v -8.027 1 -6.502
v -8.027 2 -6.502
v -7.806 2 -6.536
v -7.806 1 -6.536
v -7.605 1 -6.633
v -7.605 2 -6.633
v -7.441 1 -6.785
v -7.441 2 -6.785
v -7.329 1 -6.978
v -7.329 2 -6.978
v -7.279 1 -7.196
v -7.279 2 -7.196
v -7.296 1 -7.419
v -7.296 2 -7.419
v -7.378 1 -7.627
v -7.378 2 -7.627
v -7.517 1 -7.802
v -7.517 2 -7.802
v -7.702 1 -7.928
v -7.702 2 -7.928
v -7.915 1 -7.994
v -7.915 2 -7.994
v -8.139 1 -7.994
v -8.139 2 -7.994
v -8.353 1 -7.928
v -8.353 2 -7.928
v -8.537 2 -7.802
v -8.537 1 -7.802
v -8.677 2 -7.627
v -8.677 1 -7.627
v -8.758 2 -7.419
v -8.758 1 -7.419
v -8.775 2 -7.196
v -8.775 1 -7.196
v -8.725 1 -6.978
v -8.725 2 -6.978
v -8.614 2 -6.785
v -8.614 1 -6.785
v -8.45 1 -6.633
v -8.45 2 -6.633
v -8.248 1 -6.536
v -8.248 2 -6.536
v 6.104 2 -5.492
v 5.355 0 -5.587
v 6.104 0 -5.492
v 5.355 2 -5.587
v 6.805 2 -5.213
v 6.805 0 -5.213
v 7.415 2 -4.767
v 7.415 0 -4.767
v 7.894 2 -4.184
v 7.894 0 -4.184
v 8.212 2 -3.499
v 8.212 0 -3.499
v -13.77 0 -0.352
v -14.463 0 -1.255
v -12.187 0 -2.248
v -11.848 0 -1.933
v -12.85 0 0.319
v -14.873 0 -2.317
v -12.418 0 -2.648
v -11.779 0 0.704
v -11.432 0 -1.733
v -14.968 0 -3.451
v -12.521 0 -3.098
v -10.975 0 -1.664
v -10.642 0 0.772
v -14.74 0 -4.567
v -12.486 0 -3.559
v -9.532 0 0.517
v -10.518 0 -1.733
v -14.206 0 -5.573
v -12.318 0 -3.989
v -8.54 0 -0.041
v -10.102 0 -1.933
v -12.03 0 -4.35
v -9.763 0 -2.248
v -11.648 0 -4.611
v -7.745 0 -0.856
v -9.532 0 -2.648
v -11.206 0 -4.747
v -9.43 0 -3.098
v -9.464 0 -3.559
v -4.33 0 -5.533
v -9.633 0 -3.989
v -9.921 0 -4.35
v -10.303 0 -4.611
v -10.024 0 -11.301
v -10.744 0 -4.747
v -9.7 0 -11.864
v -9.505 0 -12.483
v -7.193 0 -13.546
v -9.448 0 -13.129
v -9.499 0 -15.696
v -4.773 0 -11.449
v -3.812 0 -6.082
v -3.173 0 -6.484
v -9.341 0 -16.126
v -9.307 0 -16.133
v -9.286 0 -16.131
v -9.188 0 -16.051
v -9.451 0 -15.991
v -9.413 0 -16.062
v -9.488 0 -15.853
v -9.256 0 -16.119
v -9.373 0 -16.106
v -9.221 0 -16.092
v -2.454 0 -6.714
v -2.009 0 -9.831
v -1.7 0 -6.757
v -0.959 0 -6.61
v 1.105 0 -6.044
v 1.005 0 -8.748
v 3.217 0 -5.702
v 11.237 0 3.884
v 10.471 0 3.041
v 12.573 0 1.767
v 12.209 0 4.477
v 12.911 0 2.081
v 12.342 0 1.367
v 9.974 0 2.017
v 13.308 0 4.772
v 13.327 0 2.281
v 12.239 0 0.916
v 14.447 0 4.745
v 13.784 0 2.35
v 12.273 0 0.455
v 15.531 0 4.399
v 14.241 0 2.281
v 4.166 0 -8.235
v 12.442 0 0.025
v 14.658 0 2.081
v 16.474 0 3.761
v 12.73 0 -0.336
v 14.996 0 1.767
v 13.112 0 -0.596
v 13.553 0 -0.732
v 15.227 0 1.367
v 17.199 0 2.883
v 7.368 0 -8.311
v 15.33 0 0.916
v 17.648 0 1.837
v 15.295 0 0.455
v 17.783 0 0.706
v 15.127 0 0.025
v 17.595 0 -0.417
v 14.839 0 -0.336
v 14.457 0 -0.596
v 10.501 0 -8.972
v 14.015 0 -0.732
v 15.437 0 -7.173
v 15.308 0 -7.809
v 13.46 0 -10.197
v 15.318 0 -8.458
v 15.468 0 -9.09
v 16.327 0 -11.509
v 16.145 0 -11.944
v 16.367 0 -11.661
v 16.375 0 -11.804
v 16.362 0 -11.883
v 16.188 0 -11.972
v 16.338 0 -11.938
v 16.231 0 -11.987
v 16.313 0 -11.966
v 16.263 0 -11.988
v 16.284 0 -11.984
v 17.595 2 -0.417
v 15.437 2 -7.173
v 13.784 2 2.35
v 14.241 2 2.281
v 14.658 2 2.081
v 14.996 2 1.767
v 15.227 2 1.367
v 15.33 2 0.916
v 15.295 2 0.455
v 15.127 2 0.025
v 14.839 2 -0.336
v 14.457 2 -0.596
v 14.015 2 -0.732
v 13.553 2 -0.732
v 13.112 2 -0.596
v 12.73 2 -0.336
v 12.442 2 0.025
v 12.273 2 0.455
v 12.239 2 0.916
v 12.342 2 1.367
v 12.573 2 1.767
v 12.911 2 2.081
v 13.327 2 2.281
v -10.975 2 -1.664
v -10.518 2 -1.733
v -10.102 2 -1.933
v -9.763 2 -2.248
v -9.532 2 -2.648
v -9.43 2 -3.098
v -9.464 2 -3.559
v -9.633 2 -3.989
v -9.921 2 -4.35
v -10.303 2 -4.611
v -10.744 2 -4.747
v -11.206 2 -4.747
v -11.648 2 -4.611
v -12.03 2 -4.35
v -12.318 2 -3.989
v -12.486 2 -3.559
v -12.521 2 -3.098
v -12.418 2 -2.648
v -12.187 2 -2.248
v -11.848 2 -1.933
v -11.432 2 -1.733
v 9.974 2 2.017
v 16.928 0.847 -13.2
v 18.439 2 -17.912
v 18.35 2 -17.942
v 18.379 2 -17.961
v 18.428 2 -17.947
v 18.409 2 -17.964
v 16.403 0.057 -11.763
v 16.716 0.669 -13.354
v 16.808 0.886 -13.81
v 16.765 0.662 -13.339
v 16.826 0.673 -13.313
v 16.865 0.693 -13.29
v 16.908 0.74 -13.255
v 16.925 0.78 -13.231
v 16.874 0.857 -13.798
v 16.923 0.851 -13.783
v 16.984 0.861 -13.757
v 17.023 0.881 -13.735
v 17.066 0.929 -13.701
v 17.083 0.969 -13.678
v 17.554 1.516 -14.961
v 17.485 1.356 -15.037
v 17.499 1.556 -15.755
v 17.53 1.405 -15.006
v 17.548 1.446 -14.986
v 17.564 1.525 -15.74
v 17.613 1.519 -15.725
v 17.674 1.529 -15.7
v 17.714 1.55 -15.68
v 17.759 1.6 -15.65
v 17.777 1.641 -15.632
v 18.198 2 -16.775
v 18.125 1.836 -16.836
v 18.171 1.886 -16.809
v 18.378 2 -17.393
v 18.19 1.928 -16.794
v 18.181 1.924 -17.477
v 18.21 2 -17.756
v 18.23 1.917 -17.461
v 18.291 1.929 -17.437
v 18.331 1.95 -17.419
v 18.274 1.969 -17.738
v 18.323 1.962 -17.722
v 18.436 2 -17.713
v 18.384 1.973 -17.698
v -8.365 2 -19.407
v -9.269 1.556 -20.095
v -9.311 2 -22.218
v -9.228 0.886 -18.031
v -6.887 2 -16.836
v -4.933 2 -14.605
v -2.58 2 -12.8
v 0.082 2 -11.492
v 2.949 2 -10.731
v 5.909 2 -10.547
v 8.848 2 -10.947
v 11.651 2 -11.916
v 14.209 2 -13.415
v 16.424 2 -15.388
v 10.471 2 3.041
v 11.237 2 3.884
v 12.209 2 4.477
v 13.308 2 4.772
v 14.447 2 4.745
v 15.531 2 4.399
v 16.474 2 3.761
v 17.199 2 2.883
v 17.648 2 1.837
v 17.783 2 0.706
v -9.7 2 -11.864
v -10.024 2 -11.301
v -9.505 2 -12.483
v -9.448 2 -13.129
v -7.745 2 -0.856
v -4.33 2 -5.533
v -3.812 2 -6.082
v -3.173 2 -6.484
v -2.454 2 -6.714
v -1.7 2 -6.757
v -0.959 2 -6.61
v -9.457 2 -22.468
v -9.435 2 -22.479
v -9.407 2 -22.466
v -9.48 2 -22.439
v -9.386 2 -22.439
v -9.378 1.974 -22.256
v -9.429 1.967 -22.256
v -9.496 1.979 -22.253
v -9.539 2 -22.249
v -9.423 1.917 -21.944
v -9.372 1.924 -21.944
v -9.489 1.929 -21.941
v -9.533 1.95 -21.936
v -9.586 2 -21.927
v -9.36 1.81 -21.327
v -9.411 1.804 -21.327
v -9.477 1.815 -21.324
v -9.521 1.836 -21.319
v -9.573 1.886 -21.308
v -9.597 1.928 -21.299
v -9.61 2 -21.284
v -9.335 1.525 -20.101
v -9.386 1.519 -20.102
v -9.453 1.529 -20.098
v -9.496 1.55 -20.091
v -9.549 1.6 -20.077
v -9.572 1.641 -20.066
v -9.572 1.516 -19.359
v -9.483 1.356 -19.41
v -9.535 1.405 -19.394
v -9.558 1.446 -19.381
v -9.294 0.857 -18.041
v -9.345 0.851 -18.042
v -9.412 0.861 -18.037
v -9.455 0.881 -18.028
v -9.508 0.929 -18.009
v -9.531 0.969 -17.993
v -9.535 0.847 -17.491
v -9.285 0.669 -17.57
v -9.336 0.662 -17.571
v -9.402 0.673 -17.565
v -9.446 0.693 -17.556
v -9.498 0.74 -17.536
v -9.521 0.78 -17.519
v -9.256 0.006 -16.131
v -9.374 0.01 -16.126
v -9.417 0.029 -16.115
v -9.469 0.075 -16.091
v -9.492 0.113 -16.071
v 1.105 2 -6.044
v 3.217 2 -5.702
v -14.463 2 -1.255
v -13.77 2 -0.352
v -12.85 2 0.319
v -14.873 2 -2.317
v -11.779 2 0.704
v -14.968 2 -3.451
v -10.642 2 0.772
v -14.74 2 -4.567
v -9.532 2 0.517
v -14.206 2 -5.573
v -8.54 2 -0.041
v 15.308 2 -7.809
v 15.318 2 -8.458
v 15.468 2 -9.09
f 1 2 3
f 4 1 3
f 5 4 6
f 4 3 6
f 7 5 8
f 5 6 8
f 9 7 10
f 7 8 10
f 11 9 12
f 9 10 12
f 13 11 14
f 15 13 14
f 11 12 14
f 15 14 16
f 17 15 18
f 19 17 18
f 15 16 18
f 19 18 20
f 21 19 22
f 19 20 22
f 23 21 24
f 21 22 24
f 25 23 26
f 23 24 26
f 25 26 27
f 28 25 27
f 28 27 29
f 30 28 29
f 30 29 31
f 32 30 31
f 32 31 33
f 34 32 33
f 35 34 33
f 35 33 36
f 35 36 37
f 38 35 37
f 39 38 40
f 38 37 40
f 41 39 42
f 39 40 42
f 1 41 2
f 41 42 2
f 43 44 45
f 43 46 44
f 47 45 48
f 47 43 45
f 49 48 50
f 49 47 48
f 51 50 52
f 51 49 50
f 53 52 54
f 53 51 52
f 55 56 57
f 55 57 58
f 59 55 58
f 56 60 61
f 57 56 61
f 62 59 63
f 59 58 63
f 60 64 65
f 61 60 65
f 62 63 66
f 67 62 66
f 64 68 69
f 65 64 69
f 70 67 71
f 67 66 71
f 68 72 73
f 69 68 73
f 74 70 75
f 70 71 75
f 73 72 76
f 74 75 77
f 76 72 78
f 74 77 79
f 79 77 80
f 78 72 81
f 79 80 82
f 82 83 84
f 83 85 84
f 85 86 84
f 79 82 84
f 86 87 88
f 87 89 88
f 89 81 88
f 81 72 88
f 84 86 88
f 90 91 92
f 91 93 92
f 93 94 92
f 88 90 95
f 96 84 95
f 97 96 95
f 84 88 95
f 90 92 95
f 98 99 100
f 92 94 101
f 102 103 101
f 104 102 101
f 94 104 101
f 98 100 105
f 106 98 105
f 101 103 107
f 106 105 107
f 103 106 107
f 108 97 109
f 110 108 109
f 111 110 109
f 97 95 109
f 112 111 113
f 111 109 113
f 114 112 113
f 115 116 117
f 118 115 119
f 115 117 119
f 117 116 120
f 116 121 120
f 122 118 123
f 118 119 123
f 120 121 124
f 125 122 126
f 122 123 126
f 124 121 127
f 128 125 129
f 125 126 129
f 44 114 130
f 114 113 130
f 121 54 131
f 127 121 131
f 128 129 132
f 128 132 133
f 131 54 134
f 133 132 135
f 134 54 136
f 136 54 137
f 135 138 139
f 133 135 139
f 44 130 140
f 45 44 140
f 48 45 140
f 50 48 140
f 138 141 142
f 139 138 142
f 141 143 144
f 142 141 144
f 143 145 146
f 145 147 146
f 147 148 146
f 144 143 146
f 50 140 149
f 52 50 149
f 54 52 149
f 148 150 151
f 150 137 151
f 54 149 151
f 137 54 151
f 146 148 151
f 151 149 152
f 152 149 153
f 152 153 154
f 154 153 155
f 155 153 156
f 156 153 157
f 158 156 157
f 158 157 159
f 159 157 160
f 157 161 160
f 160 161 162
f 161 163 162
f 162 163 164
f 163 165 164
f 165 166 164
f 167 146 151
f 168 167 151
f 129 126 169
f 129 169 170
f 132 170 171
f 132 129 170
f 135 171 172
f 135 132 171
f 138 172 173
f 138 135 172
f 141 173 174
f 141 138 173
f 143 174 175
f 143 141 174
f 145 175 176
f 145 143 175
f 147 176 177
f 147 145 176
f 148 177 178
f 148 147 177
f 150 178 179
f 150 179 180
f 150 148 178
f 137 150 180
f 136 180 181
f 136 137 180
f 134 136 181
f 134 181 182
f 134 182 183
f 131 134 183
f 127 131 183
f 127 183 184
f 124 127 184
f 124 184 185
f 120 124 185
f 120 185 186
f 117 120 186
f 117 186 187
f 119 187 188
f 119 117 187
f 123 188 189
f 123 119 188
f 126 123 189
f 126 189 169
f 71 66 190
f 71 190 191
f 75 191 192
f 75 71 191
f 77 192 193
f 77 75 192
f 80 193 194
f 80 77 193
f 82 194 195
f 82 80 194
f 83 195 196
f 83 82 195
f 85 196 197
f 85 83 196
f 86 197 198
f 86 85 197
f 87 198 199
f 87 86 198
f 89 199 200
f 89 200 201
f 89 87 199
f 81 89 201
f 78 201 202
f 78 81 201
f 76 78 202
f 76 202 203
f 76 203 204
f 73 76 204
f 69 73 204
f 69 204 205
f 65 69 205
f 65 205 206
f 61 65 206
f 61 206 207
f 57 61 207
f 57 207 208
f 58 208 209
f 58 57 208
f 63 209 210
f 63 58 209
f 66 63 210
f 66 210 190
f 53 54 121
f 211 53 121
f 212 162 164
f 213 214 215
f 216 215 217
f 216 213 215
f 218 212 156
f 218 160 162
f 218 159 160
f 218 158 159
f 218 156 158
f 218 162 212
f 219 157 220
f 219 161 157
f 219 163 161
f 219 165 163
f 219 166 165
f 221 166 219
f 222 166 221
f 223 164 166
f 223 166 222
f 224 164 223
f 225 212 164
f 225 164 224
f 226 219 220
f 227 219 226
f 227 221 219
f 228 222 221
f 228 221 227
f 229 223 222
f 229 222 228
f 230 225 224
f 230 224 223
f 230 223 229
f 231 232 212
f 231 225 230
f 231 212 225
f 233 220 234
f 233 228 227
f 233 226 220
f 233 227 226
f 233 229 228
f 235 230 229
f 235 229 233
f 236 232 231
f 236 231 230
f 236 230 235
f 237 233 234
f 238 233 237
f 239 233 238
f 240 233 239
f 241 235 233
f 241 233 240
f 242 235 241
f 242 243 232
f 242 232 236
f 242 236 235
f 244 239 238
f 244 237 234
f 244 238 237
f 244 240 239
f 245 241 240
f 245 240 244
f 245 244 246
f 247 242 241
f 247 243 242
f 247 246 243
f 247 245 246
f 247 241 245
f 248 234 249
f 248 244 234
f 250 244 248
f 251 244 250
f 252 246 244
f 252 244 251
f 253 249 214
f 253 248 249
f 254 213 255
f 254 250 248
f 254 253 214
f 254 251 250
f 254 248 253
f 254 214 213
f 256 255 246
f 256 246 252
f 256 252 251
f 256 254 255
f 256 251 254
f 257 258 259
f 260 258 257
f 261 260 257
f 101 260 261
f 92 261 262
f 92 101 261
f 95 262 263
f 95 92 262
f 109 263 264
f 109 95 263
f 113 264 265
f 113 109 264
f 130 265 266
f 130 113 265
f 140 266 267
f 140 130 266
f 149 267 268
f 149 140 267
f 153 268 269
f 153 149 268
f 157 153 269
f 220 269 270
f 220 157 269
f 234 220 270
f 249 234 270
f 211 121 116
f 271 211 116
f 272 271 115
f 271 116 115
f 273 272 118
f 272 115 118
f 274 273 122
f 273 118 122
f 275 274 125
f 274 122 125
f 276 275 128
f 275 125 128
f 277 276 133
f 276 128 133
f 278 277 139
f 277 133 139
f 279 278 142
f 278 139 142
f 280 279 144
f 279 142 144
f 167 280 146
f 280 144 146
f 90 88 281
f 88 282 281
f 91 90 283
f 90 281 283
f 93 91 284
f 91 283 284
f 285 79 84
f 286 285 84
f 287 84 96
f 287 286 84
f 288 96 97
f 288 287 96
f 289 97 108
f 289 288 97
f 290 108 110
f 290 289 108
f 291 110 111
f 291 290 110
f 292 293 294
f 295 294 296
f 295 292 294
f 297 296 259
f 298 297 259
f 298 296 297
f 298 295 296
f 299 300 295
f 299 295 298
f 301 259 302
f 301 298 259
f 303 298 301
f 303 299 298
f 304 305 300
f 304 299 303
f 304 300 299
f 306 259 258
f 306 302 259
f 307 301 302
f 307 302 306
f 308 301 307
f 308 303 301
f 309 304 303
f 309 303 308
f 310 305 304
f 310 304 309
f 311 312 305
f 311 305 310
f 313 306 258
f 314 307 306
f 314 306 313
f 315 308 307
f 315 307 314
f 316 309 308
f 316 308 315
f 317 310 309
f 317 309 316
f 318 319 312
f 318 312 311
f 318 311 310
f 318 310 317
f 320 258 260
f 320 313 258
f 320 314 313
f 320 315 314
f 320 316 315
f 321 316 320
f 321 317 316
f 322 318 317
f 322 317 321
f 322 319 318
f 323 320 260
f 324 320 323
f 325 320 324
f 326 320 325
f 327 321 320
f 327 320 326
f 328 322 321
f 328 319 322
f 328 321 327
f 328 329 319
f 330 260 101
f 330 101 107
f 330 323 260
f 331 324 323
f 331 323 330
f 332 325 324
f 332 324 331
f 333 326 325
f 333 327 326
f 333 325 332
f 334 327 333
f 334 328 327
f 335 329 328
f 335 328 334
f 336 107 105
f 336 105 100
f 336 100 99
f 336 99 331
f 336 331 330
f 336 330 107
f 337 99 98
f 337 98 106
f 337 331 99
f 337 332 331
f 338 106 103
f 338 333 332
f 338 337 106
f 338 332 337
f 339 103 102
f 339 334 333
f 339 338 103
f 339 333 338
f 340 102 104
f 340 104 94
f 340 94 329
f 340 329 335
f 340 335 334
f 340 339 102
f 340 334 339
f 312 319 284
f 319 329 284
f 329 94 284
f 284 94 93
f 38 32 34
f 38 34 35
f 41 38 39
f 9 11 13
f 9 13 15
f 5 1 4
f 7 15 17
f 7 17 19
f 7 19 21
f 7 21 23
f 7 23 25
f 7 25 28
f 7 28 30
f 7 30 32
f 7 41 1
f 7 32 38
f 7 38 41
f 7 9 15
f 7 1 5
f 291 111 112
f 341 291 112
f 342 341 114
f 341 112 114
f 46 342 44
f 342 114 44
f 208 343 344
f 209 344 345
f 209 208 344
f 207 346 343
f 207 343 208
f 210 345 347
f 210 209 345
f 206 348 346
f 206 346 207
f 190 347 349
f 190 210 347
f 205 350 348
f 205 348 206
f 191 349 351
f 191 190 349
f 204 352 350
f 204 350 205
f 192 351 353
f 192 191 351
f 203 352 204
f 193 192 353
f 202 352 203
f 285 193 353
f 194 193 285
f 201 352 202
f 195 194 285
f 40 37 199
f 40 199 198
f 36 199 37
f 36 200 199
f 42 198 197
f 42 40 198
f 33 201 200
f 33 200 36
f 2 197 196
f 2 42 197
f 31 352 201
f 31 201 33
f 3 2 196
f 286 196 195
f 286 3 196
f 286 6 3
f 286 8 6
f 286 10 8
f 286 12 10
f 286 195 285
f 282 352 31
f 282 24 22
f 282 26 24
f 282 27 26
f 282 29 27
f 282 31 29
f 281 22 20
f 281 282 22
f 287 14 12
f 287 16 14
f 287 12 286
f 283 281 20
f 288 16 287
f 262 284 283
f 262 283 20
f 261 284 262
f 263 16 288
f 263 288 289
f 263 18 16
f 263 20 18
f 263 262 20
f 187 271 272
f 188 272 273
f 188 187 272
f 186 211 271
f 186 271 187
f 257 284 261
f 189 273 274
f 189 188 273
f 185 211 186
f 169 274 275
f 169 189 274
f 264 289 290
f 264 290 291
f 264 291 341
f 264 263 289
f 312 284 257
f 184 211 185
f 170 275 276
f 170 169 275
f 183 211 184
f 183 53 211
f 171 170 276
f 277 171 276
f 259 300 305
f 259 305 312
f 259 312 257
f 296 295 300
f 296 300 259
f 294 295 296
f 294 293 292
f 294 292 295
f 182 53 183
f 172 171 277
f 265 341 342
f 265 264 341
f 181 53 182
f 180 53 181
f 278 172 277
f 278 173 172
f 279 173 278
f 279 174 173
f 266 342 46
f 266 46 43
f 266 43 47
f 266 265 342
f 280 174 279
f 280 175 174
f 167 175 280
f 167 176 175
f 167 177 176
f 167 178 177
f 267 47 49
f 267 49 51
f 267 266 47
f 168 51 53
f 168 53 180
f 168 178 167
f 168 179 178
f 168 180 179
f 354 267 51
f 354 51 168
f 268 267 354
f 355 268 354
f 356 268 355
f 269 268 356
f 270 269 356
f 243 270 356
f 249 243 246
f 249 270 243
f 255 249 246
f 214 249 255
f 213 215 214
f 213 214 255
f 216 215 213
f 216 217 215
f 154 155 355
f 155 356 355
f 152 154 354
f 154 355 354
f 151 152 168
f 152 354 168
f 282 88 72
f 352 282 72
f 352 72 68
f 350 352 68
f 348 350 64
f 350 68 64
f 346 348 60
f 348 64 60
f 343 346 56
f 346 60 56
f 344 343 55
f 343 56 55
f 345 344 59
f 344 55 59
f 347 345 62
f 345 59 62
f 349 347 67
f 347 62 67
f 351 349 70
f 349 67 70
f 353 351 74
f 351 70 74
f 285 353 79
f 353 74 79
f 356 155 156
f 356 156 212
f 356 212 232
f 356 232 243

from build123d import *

# Parameters (mm, degrees)
SKETCH_1_R          = 1.55
EXTRUDE_1_DEPTH     = 2
FILLET_1_R          = 3
FILLET_2_R          = 0.2
SKETCH_3_R          = 0.75
CUT_EXTRUDE_1_DEPTH = 1


with BuildPart() as part:
    # 草图1 → 凸台-拉伸1 (new body)
    with BuildSketch(Plane(origin=(0, 0, 0), x_dir=(1, 0, 0), z_dir=(0, 1, 0))):
        with BuildLine():
            Line((-9.427629845, 12.118007633), (-14.205972572, 5.57250637))
            ThreePointArc((-14.205972572, 5.57250637), (-13.333741258, -0.01669863), (-7.744536258, 0.855532684))
            Line((-7.744536258, 0.855532684), (-2.966193531, 7.401033946))
            ThreePointArc((-2.966193531, 7.401033946), (2.156455687, 5.844533995), (7.508476858, 5.702771934))
            Line((7.508476858, 5.702771934), (9.973957748, -2.017173013))
            ThreePointArc((9.973957748, -2.017173013), (15.001264118, -4.610663069), (17.594754173, 0.416643301))
            Line((17.594754173, 0.416643301), (15.129273283, 8.136588247))
            Line((15.129273283, 8.136588247), (19.53886034, 20.548398832))
            ThreePointArc((19.53886034, 20.548398832), (2.94865648, 10.730730666), (-9.689752685, 25.287244194))
            Line((-9.689752685, 25.287244194), (-9.427629845, 12.118007633))
        make_face()
        with Locations(Location((13.784355961, -0.800264856, 0), (0, 0, 270))):
            Circle(SKETCH_1_R, mode=Mode.SUBTRACT)
        with Locations(Location((-10.975254415, 3.214019527, 0), (0, 0, 270))):
            Circle(SKETCH_1_R, mode=Mode.SUBTRACT)
    extrude(amount=EXTRUDE_1_DEPTH)

    # 圆角1
    fillet_1_edges = [part.edges().sort_by_distance(p)[0] for p in [
        (-9.427629845, 1, -12.118007633),
        (15.129273283, 1, -8.136588247),
        (7.508476858, 1, -5.702771934),
        (-2.966193531, 1, -7.401033946),
    ]]
    fillet(fillet_1_edges, radius=FILLET_1_R)

    # 草图2 → 切除-旋转1 (revolve, cut)
    with BuildSketch(Plane(origin=(5.357266973, 0, 0), x_dir=(0, -1, 0), z_dir=(-1, 0, 0))):
        with BuildLine():
            Line((43.030031962, -25.586742765), (-7.030031962, -25.586742765))
            ThreePointArc((-7.030031962, -25.586742765), (18, -0.556710804), (43.030031962, -25.586742765))
        make_face()
    revolve(axis=Axis((5.357266973, -43.030031962, -25.586742765), (0, 1, 0)), mode=Mode.SUBTRACT)

    # 圆角2
    # the kernel refuses this fillet: 0.2 mm, written as the material it takes off along each edge
    with BuildSketch(Plane(origin=(19.53886034, -18, -20.548398832), x_dir=(-0.1606859623720409, 0.8772773226728997, 0.4522880947144644), z_dir=(-0.29368936055859224, -0.47998385298244073, 0.8266571601158587))) as fillet_2_piece_1:
        with BuildLine():
            CenterArc((20.396862817, 0.2), FILLET_2_R, 143.943391902, 126.056608098)
            Line((20.396862817, 0), (20, 0))
            ThreePointArc((20, 0), (20.118215024, 0.158394169), (20.235175643, 0.317716854))
        make_face()
    revolve(axis=Axis((19.53886034, -18, -20.548398832), (-0.9422985625539585, 0, -0.3347736832678813)), revolution_arc=31.526759785, mode=Mode.SUBTRACT)
    with BuildSketch(Plane(origin=(-9.689752685, -18, -25.287244194), x_dir=(-0.0009868358148414909, 0.9987697013737694, -0.049579328079614966), z_dir=(-0.01987575403412073, -0.049589148185379746, -0.9985719156794987))) as fillet_2_piece_2:
        with BuildLine():
            CenterArc((20.396862817, 0.2), FILLET_2_R, 143.943391902, 126.056608098)
            ThreePointArc((20.235175643, 0.317716854), (20.118215024, 0.158394169), (20, 0))
            Line((20, 0), (20.396862817, 0))
        make_face()
    revolve(axis=Axis((-9.689752685, -18, -25.287244194), (0.9998019706705172, 0, -0.019900237268694068)), revolution_arc=31.526762102, mode=Mode.SUBTRACT)

    # 草图3 → 切除-拉伸1 (cut)
    with BuildSketch(Plane(origin=(0, 2, 0), x_dir=(1, 0, 0), z_dir=(0, 1, 0))):
        with Locations(Location((-8.027145861, 7.252417223, 0), (0, 0, 270))):
            Circle(SKETCH_3_R)
    extrude(amount=-CUT_EXTRUDE_1_DEPTH, mode=Mode.SUBTRACT)


solid = part.part
